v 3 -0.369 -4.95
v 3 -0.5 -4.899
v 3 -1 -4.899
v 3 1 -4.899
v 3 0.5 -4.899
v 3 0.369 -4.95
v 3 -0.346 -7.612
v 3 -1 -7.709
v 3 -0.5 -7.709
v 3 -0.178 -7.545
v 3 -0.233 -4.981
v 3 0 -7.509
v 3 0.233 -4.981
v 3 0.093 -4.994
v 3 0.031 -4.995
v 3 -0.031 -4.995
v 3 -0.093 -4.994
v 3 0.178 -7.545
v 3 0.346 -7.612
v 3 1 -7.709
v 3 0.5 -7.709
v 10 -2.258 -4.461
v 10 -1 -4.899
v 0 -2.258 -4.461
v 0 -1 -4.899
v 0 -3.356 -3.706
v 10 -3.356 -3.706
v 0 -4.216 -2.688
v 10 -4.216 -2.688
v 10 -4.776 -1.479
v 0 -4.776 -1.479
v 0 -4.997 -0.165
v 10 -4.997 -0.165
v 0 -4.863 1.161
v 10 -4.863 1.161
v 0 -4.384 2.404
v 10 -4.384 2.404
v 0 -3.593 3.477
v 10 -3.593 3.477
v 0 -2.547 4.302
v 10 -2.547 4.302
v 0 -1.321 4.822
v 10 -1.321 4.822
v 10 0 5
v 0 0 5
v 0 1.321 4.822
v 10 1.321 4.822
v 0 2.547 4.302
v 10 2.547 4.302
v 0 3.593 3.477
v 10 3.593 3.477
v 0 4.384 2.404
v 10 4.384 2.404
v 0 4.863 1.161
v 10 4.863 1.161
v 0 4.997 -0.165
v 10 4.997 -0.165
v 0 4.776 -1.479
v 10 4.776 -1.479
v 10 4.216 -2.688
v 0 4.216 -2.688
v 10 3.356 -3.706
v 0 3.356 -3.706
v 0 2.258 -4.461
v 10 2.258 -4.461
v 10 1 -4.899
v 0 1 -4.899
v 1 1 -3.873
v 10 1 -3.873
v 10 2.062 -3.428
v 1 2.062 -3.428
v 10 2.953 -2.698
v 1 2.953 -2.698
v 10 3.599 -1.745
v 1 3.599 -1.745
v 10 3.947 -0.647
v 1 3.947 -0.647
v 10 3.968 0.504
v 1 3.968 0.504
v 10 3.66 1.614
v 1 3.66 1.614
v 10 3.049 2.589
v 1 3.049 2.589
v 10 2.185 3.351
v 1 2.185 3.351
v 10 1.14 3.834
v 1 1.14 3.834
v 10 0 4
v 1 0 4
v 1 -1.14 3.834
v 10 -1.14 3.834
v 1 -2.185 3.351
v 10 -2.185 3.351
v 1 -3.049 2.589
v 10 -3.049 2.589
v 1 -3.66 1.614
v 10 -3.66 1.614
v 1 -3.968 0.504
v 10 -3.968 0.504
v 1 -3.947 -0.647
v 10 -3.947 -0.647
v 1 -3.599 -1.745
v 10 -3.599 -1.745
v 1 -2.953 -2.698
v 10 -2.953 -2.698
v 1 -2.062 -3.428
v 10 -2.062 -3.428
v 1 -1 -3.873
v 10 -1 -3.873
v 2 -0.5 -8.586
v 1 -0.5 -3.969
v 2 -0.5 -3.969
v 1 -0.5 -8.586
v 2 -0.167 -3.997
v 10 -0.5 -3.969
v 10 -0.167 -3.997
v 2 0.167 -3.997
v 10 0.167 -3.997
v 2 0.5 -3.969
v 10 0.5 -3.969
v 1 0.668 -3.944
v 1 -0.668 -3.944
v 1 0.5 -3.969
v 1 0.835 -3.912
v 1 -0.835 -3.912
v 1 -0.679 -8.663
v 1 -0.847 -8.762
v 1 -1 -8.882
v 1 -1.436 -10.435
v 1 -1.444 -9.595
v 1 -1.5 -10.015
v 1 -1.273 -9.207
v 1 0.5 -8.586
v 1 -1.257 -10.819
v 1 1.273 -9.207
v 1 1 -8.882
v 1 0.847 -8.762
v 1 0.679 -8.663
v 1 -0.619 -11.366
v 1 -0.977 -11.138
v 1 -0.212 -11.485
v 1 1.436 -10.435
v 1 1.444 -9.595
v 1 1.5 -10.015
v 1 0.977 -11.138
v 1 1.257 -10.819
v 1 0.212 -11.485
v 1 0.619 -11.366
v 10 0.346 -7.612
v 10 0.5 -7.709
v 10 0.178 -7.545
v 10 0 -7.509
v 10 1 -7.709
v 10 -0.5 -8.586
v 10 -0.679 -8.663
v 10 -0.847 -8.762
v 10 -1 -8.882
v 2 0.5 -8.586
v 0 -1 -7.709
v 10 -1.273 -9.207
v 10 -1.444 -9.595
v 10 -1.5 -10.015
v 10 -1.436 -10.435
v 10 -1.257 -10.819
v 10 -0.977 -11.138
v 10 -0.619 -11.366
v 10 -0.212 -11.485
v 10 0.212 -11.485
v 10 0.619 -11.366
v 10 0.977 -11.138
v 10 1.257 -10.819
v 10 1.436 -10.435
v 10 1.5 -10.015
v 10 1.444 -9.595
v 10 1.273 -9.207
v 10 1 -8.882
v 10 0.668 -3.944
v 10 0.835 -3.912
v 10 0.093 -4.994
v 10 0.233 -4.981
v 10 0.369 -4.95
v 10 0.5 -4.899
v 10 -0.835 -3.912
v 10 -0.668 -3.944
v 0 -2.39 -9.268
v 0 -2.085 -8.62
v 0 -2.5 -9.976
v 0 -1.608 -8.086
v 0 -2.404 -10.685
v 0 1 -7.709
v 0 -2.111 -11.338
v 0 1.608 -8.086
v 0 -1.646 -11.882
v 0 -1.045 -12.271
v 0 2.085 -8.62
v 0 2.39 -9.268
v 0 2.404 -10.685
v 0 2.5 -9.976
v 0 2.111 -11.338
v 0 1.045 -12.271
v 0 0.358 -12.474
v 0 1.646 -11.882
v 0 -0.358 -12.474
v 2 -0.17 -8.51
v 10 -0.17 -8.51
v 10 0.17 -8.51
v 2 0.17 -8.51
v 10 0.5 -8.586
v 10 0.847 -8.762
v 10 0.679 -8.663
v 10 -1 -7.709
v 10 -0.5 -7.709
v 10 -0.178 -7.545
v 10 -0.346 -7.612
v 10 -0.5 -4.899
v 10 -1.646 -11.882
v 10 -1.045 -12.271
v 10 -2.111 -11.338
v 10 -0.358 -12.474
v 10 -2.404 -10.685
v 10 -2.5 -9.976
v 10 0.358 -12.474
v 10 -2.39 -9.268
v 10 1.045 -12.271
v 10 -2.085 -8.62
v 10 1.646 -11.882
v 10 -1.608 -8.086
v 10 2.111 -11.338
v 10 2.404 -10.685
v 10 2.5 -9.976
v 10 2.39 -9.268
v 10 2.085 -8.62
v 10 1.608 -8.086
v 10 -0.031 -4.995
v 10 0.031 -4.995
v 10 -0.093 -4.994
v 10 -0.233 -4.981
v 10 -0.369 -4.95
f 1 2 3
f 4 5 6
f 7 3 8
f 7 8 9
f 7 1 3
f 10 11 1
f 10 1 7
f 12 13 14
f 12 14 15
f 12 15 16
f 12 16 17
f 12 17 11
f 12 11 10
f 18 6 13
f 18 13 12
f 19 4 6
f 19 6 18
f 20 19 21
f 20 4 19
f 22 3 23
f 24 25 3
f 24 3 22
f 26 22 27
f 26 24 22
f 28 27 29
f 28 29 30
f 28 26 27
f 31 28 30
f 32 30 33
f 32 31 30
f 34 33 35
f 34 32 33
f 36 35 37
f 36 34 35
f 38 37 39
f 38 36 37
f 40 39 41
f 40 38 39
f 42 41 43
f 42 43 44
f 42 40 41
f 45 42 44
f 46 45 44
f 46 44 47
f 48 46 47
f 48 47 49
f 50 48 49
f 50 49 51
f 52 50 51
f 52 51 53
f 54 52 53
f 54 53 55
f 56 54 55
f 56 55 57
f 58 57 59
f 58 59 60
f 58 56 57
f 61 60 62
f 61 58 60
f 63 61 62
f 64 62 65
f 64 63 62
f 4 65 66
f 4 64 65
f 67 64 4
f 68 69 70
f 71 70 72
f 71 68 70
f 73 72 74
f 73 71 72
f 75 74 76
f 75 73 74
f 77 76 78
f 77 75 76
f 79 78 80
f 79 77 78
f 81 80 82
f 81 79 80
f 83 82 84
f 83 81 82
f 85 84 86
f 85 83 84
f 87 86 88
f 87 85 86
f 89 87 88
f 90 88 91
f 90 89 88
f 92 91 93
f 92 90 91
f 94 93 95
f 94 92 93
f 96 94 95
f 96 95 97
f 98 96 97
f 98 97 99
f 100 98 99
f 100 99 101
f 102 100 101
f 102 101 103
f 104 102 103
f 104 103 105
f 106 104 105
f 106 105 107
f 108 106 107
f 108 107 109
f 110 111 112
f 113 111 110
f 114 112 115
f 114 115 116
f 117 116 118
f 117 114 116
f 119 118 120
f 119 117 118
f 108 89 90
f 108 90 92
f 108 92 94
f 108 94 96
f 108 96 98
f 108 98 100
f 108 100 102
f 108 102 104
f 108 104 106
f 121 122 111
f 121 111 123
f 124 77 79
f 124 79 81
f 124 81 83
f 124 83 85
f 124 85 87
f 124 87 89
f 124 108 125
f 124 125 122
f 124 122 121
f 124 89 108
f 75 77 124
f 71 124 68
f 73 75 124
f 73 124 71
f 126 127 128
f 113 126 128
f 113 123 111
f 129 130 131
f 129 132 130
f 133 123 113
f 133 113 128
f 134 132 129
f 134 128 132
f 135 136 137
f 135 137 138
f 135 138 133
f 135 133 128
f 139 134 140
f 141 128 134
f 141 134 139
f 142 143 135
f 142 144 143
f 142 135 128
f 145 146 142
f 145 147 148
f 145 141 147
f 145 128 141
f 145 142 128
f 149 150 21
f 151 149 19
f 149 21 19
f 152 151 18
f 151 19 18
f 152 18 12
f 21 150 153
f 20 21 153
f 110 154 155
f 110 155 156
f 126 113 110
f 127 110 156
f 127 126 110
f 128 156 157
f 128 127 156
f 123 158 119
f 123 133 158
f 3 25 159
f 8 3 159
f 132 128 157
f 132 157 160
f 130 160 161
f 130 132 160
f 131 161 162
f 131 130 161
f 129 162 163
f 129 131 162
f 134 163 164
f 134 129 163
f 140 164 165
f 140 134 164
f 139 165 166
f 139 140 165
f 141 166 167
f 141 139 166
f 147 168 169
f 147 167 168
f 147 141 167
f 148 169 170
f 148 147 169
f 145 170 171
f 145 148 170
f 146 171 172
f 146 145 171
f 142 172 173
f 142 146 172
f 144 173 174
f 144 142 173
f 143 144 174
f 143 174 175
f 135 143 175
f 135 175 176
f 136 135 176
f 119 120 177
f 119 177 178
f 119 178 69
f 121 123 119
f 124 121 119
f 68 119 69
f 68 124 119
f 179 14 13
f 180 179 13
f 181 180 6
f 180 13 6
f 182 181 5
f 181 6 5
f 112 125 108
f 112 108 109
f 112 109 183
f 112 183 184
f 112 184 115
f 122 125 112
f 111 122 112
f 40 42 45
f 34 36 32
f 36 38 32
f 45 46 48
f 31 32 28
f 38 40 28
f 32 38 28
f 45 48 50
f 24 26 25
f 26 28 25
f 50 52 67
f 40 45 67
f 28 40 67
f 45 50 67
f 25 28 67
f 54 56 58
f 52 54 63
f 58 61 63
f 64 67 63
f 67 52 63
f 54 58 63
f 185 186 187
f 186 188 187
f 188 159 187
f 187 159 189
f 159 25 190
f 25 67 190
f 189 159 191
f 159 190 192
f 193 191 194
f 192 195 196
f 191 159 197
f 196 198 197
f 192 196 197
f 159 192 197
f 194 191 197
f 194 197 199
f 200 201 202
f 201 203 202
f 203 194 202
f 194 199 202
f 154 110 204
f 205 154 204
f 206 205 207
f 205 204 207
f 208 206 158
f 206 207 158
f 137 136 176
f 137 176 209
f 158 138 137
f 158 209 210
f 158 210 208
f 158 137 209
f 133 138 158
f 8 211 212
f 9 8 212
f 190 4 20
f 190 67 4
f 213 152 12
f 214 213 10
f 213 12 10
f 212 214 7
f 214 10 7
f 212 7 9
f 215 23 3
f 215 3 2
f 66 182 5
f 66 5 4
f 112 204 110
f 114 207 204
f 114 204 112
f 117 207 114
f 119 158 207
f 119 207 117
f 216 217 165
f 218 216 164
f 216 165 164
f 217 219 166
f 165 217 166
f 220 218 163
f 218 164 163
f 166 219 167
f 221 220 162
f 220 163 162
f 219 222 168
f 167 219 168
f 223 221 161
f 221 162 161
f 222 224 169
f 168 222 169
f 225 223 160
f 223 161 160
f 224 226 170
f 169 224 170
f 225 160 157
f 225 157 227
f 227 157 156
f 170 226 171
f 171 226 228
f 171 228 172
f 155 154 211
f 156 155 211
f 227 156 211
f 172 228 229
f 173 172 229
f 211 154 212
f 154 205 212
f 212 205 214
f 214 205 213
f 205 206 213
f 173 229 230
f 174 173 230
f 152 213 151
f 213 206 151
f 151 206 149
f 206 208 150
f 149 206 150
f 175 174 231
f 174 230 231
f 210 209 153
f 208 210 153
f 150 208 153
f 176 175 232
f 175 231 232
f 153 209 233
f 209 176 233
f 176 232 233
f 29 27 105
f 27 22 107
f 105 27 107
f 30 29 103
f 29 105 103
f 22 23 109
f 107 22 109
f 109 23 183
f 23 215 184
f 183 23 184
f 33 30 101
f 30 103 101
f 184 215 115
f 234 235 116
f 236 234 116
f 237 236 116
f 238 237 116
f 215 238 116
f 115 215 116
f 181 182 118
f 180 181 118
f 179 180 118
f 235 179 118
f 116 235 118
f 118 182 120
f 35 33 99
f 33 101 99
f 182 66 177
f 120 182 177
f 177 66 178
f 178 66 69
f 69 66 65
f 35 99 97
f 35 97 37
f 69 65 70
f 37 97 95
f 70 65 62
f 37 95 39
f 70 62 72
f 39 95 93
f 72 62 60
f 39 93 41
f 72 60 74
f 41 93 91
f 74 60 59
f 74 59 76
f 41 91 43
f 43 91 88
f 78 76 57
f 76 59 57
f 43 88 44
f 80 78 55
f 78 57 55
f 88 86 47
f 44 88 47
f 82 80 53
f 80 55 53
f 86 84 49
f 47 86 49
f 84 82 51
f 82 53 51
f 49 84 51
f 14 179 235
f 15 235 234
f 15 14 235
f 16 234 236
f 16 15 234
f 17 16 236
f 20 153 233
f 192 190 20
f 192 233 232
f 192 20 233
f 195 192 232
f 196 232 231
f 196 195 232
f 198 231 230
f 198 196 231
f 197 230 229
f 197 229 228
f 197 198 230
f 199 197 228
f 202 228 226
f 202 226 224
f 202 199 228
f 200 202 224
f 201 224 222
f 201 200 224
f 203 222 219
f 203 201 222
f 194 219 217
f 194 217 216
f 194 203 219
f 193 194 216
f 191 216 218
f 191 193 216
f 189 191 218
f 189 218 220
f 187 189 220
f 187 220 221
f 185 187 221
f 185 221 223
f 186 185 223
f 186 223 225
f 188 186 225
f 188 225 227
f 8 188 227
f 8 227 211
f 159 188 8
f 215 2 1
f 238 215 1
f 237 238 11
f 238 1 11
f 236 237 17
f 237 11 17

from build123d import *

# Parameters (mm, degrees)
BOSS_EXTRUDE3_DEPTH = 10
BOSS_EXTRUDE4_DEPTH = 1
CUT_EXTRUDE1_START  = -9
SKETCH3_R           = 4
SKETCH3_R_2         = 1.5
CUT_EXTRUDE1_DEPTH  = 9
SKETCH4_W           = 2.809732667
SKETCH4_H           = 2
CUT_EXTRUDE2_DEPTH  = 8
SKETCH5_W           = 2.809732667
SKETCH5_H           = 2
BOSS_EXTRUDE5_DEPTH = 1
BOSS_EXTRUDE6_START = -8
BOSS_EXTRUDE6_DEPTH = 8
FILLET3_R           = 1


with BuildPart() as part:
    # Sketch1 → Boss-Extrude3 (new body)
    with BuildSketch(Plane(origin=(0, 0, 0), x_dir=(0, 0, -1), z_dir=(1, 0, 0))):
        with BuildLine():
            Line((7.708712153, -1), (4.898979486, -1))
            ThreePointArc((4.898979486, -1), (-5, 0), (4.898979486, 1))
            Line((4.898979486, 1), (7.708712153, 1))
            ThreePointArc((7.708712153, 1), (12.5, 0), (7.708712153, -1))
        make_face()
        with BuildLine():
            ThreePointArc((8.881966011, -1), (11.5, 0), (8.881966011, 1))
            Line((8.881966011, 1), (8.881966011, 0.5))
            Line((8.881966011, 0.5), (3.872983346, 0.5))
            Line((3.872983346, 0.5), (3.872983346, 1))
            ThreePointArc((3.872983346, 1), (-4, 0), (3.872983346, -1))
            Line((3.872983346, -1), (3.872983346, -0.5))
            Line((3.872983346, -0.5), (8.881966011, -0.5))
            Line((8.881966011, -0.5), (8.881966011, -1))
        make_face(mode=Mode.SUBTRACT)
    extrude(amount=BOSS_EXTRUDE3_DEPTH)

    # Sketch2 → Boss-Extrude4 (add)
    with BuildSketch(Plane.ZY):
        with BuildLine():
            Line((-8.585786438, 0.5), (-3.968626967, 0.5))
            ThreePointArc((-3.968626967, 0.5), (4, 0), (-3.968626967, -0.5))
            Line((-3.968626967, -0.5), (-8.585786438, -0.5))
            ThreePointArc((-8.585786438, -0.5), (-11.5, 0), (-8.585786438, 0.5))
        make_face()
    extrude(amount=-BOSS_EXTRUDE4_DEPTH)

    # Sketch3 → Cut-Extrude1 (cut)
    with BuildSketch(Plane(origin=(10, 0, 0), x_dir=(0, 0, -1), z_dir=(1, 0, 0)).offset(CUT_EXTRUDE1_START)):
        Circle(SKETCH3_R)
        with Locations((10, 0)):
            Circle(SKETCH3_R_2)
    extrude(amount=CUT_EXTRUDE1_DEPTH, mode=Mode.SUBTRACT)

    # Sketch4 → Cut-Extrude2 (cut)
    with BuildSketch(Plane(origin=(10, 0, 0), x_dir=(0, 0, -1), z_dir=(1, 0, 0))):
        with Locations((6.30384582, 0)):
            Rectangle(SKETCH4_W, SKETCH4_H)
    extrude(amount=-CUT_EXTRUDE2_DEPTH, mode=Mode.SUBTRACT)

    # Sketch5 → Boss-Extrude5 (add)
    with BuildSketch(Plane(origin=(2, 0, 0), x_dir=(0, 0, -1), z_dir=(1, 0, 0))):
        with Locations((6.30384582, 0)):
            Rectangle(SKETCH5_W, SKETCH5_H)
    extrude(amount=BOSS_EXTRUDE5_DEPTH)

    # Sketch6 → Boss-Extrude6 (add)
    with BuildSketch(Plane(origin=(10, 0, 0), x_dir=(0, 0, -1), z_dir=(1, 0, 0)).offset(BOSS_EXTRUDE6_START)):
        with BuildLine():
            Line((3.968626967, 0.5), (4.969531559, 0.5))
            ThreePointArc((4.969531559, 0.5), (4.994621499, 0), (4.969531559, -0.5))
            Line((4.969531559, -0.5), (3.968626967, -0.5))
            ThreePointArc((3.968626967, -0.5), (4, 0), (3.968626967, 0.5))
        make_face()
        with BuildLine():
            Line((8.585786438, 0.5), (7.550510257, 0.5))
            ThreePointArc((7.550510257, 0.5), (7.5, 0), (7.550510257, -0.5))
            Line((7.550510257, -0.5), (8.585786438, -0.5))
            ThreePointArc((8.585786438, -0.5), (8.5, 0), (8.585786438, 0.5))
        make_face()
    extrude(amount=BOSS_EXTRUDE6_DEPTH)

    # Fillet3
    # the kernel refuses this fillet: 1 mm, written as the material it takes off along each edge
    with BuildSketch(Plane(origin=(3, 0.5, -4.969531559), x_dir=(0, -0.9982310173351231, -0.059454487047532374), z_dir=(1, 0, 0))) as fillet3_piece_1:
        with BuildLine():
            CenterArc((0.366534345, -0.999168363), FILLET3_R, 87.663129738, 24.097452775)
            Line((-0.004194637, -0.070427268), (0, 0))
            ThreePointArc((0, 0), (0.203654559, 0.004153711), (0.407309118, 0))
        make_face()
    extrude(amount=8.018272795, mode=Mode.SUBTRACT)
    with BuildSketch(Plane(origin=(3, -0.5, -4.969531559), x_dir=(0, 0, 1), z_dir=(1, 0, 0))) as fillet3_piece_2:
        with BuildLine():
            CenterArc((0.97560874, -0.425290994), FILLET3_R, 154.830916209, 24.097452775)
            ThreePointArc((-0.024216355, -0.406588595), (-0.016254541, -0.203047341), (0, 0))
            Line((0, 0), (0.070552073, 0))
        make_face()
    extrude(amount=8.018272795, mode=Mode.SUBTRACT)
    with BuildSketch(Plane(origin=(3, -0.5, -7.550510257), x_dir=(0, 8.127970304186451e-12, -1.0), z_dir=(1, 0, 0))) as fillet3_piece_3:
        with BuildLine():
            CenterArc((0.953276133, 0.606512125), FILLET3_R, 175.928109784, 41.40962211)
            ThreePointArc((-0.044199608, 0.677520208), (-0.045207292, 0.337252633), (0, 0))
            Line((0, 0), (0.158201895, 0))
        make_face()
    extrude(amount=8.697401022, mode=Mode.SUBTRACT)
    with BuildSketch(Plane(origin=(3, 0.5, -7.550510257), x_dir=(0, -0.9978788138478943, 0.06509894679270496), z_dir=(1, 0, 0))) as fillet3_piece_4:
        with BuildLine():
            CenterArc((0.543168327, 0.990737357), FILLET3_R, 236.394802514, 41.40962211)
            Line((-0.010298777, 0.15786632), (0, 0))
            ThreePointArc((0, 0), (0.339480204, -0.023156608), (0.678960409, 0))
        make_face()
    extrude(amount=8.697401022, mode=Mode.SUBTRACT)


solid = part.part
